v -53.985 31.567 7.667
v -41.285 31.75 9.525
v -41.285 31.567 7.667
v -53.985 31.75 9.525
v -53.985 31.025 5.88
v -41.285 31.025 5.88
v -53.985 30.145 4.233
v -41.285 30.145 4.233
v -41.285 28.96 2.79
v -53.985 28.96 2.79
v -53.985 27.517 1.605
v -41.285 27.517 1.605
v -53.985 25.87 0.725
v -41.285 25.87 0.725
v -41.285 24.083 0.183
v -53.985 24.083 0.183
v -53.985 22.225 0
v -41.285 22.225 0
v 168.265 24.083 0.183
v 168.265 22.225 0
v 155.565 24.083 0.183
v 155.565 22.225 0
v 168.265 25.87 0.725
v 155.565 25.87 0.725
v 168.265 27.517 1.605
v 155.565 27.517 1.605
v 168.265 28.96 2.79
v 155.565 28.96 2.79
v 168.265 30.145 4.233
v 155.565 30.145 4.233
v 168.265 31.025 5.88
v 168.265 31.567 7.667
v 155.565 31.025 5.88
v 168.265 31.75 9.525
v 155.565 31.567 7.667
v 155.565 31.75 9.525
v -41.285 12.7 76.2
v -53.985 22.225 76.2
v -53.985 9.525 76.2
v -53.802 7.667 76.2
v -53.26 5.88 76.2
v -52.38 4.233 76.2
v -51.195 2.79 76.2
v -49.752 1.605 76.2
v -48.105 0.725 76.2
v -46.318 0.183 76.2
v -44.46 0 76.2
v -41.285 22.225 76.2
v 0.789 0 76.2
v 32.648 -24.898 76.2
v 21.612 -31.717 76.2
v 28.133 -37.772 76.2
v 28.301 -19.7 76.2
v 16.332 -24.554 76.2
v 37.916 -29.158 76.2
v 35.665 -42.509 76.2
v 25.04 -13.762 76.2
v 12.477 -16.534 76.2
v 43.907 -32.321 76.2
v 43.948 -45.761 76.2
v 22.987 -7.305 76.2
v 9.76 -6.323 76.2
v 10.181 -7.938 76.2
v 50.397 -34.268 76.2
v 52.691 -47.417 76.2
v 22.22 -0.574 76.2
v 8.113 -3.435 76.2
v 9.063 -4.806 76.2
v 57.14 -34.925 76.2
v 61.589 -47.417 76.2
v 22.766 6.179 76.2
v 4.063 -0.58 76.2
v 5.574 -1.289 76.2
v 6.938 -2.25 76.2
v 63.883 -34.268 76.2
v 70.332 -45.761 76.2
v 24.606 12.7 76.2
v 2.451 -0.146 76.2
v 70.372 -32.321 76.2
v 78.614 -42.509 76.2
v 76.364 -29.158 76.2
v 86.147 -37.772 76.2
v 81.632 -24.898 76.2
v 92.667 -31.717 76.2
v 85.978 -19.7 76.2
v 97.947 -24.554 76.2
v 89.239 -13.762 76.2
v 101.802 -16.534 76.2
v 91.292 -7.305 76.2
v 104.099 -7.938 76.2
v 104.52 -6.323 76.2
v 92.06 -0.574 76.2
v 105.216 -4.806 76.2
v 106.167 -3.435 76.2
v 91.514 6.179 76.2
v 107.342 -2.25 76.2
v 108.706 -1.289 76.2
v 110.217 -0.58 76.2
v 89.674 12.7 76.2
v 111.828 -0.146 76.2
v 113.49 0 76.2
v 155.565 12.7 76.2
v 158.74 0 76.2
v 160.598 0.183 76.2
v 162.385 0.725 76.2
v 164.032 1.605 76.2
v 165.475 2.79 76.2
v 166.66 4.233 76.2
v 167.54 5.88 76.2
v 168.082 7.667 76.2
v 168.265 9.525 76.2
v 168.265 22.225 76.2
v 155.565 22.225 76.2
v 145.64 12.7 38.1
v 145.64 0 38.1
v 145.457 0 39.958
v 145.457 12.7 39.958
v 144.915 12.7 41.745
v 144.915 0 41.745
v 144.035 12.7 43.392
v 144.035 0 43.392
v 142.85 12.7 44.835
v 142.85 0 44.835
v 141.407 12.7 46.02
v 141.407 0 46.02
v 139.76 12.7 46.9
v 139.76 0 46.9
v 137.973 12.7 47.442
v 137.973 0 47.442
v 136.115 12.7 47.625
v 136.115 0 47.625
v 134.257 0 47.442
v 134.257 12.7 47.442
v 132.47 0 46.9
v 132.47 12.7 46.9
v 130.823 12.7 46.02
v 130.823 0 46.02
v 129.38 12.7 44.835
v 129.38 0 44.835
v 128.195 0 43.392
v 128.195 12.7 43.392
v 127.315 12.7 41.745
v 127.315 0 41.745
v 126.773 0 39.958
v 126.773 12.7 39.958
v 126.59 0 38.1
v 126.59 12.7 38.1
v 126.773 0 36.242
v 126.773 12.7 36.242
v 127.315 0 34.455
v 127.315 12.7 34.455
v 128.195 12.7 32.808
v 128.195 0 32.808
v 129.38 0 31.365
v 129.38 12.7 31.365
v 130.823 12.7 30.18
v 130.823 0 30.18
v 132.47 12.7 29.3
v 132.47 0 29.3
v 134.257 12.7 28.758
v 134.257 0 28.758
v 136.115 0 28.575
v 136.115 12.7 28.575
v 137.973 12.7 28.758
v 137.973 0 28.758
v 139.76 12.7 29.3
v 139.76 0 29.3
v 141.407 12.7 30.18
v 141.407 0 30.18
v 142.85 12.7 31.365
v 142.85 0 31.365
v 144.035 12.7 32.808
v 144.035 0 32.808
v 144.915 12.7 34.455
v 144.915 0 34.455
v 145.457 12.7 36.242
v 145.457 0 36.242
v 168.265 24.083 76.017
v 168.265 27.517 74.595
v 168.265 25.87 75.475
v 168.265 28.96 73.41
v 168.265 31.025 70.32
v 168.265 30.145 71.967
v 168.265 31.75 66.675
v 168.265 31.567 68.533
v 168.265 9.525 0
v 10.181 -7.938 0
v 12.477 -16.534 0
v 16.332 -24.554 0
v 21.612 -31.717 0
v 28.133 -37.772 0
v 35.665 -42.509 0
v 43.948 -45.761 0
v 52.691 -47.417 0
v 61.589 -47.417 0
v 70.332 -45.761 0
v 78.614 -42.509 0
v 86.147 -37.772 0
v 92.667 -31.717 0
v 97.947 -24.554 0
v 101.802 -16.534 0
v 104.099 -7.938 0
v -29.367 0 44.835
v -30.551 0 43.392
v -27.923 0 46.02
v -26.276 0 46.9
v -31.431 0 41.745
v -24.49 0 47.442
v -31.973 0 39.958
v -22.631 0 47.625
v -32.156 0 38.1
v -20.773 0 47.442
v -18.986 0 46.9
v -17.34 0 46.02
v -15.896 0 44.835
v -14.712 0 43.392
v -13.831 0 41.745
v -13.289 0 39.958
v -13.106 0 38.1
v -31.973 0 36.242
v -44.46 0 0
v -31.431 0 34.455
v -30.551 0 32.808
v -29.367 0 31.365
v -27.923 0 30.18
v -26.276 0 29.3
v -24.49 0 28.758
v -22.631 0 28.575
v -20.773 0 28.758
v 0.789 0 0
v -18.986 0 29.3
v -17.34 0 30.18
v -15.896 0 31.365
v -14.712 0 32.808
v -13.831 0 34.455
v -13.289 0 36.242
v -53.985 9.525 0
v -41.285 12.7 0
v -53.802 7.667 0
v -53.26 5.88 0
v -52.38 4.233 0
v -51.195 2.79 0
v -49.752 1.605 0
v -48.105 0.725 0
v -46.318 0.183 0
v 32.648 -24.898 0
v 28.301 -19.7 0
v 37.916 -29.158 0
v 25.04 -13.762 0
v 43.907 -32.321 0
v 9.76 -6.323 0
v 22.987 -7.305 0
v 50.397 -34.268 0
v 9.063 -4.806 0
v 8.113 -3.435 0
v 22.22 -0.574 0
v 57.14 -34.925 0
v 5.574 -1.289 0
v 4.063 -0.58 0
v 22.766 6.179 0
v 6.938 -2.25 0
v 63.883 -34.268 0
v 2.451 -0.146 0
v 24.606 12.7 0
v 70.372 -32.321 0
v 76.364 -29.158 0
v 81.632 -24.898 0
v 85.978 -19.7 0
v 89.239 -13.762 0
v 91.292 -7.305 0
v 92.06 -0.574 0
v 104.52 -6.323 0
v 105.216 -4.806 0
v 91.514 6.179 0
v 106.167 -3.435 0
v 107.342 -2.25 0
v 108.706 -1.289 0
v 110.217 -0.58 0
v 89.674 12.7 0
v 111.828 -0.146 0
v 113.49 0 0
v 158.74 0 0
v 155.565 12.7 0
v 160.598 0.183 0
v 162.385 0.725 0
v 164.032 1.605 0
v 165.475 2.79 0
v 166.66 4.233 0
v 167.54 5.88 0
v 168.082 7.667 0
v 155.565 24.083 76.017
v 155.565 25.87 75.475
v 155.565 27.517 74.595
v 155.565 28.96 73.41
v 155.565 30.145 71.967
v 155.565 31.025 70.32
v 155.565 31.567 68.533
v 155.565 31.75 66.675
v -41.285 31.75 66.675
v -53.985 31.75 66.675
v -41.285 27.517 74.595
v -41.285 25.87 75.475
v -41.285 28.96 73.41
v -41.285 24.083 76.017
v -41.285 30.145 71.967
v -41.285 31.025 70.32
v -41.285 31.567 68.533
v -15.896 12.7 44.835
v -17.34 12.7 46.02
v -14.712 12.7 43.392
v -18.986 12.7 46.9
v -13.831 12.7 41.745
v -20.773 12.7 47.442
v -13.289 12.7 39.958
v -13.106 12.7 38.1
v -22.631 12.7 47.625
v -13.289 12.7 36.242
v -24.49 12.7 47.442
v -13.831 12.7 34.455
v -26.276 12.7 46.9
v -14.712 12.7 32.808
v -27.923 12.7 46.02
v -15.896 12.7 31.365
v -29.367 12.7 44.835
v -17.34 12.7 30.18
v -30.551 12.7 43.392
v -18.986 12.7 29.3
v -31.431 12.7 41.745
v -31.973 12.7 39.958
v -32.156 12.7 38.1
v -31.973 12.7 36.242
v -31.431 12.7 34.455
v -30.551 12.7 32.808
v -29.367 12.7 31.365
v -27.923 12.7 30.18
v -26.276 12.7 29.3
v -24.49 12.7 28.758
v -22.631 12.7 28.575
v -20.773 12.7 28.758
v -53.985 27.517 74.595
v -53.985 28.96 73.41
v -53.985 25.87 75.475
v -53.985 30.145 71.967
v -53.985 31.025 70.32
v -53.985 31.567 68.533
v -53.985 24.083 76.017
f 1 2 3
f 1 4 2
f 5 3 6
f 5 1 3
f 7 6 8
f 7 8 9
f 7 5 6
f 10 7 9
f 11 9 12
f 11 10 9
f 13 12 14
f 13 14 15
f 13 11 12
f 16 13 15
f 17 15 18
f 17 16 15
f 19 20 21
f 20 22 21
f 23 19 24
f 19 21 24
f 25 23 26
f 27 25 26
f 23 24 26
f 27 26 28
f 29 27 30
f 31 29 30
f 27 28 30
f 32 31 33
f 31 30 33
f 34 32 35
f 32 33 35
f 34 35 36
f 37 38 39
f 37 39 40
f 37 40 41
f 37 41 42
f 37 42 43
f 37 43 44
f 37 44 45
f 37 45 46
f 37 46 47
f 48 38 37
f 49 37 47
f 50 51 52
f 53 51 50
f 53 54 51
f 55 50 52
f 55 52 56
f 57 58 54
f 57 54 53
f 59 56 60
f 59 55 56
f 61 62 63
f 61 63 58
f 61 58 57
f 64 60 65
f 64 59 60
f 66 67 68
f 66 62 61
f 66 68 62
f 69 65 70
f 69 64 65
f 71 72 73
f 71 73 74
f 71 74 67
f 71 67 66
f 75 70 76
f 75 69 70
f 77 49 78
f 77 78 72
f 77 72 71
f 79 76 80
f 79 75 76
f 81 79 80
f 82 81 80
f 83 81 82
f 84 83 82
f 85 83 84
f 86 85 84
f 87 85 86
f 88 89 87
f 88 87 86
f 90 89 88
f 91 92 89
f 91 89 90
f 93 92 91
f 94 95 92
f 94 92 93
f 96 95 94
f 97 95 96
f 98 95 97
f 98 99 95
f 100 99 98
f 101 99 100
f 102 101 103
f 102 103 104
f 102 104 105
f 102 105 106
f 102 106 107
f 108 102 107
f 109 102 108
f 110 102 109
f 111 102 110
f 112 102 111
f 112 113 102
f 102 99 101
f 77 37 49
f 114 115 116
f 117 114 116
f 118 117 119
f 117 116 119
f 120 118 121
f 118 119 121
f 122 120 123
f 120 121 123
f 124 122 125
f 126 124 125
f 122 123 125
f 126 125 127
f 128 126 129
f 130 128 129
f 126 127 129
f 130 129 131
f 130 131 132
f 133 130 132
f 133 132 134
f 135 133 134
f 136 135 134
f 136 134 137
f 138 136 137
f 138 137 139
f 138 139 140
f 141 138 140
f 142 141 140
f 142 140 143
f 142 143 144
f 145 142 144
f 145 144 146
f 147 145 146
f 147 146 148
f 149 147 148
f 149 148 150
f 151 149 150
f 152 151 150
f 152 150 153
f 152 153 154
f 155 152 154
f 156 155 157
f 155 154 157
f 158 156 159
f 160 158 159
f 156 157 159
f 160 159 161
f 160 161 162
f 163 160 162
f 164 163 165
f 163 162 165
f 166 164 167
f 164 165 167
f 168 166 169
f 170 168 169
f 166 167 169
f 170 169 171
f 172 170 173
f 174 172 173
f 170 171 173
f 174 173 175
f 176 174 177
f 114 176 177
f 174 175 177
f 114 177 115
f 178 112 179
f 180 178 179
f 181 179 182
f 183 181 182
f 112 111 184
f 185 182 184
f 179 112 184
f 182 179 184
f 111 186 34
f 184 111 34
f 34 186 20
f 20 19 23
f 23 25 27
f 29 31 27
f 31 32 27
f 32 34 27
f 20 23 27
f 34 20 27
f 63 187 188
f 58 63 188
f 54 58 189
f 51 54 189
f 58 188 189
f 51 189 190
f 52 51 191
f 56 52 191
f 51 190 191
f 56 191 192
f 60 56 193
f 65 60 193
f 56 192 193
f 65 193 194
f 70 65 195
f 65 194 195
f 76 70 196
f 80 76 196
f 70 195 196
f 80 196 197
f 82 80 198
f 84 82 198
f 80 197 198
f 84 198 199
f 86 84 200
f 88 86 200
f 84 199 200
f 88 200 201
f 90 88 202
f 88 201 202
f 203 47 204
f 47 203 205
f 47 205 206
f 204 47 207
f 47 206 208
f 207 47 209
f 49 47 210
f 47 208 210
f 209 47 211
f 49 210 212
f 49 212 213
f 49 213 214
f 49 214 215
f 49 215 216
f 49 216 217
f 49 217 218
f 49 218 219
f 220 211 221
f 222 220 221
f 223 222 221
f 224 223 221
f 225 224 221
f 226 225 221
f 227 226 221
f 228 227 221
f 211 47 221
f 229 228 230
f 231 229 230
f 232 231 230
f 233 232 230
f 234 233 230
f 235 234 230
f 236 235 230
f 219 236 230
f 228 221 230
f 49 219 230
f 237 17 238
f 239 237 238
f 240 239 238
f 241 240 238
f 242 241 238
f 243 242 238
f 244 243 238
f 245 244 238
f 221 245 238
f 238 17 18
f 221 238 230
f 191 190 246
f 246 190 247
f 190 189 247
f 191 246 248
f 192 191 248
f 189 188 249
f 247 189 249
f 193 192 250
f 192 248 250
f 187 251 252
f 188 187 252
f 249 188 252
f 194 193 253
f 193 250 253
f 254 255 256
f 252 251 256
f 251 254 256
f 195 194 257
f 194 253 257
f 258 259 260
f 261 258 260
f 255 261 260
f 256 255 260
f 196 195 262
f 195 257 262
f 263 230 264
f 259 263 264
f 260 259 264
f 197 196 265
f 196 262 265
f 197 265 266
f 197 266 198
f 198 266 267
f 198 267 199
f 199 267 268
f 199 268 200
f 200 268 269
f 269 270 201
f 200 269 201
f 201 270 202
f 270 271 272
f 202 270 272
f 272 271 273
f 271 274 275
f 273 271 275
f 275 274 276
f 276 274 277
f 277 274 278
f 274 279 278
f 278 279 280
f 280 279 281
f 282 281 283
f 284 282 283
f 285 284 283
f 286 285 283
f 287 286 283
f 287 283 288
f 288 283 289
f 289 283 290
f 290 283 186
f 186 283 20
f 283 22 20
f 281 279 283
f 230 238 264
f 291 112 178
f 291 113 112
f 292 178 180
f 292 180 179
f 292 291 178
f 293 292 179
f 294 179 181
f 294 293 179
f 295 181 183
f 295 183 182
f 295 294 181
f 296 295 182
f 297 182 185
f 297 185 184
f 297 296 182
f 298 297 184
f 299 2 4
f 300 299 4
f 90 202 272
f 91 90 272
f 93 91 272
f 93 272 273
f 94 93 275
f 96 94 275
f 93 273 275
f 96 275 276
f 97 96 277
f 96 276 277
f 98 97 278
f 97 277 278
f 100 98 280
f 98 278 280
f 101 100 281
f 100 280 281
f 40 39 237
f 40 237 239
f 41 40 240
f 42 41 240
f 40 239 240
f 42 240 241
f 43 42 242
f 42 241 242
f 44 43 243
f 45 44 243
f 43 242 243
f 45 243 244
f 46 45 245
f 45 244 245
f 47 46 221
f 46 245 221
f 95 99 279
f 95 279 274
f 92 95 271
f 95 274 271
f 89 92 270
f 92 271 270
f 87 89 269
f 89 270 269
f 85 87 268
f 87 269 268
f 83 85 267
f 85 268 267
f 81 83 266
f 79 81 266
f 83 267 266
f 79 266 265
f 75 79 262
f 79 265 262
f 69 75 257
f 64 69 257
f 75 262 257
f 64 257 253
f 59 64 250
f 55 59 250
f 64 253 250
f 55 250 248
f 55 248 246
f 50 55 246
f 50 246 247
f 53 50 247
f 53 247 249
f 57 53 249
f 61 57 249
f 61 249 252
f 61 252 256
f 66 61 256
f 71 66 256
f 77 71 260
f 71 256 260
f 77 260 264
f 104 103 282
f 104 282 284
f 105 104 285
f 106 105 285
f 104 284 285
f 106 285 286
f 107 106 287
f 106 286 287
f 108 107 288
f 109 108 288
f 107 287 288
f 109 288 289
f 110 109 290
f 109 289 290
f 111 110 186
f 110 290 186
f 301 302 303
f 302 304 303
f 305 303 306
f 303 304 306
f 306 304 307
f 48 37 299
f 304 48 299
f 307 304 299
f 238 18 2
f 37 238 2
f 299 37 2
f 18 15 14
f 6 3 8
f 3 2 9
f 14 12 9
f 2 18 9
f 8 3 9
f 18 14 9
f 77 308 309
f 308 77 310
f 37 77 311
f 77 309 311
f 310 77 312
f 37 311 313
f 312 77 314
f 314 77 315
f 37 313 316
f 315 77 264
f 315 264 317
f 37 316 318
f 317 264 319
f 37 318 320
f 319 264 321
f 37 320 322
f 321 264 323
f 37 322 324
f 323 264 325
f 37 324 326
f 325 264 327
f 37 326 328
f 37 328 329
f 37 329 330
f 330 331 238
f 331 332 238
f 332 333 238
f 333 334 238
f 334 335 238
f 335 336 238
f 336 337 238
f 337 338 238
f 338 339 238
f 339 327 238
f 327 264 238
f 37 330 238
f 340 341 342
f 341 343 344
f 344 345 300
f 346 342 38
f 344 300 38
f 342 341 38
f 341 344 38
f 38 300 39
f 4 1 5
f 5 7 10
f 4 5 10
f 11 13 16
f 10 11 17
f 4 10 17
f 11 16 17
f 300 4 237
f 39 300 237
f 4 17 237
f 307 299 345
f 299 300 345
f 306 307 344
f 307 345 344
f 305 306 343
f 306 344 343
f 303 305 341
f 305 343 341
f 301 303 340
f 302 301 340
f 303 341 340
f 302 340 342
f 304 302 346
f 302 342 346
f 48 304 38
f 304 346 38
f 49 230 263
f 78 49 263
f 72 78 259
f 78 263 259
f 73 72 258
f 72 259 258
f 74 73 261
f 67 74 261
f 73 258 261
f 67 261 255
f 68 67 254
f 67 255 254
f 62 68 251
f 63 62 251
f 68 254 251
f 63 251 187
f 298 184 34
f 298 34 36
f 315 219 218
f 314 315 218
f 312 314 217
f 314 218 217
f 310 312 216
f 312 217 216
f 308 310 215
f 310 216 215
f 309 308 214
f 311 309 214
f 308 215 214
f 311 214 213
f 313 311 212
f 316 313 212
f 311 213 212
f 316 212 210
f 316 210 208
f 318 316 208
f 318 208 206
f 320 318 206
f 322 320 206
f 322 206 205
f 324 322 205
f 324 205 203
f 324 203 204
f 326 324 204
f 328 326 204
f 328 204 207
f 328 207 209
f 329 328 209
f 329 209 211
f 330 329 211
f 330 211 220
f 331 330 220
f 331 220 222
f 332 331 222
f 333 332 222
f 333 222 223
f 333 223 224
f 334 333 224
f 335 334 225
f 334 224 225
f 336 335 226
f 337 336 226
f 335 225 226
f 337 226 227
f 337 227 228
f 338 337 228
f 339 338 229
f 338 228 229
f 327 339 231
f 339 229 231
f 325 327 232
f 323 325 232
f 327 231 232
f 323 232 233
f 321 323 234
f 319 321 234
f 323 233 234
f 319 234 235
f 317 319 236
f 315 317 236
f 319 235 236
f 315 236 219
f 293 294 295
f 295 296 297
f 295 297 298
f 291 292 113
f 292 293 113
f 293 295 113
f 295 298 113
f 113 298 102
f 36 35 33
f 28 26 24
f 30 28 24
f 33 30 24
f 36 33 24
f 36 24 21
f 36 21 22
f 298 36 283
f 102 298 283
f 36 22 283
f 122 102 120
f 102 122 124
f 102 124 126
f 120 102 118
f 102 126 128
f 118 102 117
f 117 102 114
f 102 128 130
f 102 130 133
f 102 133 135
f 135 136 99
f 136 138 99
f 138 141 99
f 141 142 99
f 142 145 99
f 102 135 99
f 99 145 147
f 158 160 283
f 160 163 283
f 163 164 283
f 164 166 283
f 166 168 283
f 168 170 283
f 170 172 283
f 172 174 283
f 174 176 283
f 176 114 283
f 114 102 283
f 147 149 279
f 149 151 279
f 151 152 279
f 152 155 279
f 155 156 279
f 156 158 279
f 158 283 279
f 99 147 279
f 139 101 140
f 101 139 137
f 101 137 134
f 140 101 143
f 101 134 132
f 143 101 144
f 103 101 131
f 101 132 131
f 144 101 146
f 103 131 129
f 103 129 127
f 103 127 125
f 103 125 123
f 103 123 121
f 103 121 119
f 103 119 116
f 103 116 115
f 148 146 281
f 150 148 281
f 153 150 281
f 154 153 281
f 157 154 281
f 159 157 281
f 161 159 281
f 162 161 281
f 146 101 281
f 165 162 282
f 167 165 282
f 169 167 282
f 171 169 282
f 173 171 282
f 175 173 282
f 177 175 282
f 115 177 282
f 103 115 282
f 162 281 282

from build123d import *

# Parameters (mm, degrees)
F1_DEPTH = 76.2
F2_R     = 9.525
F3_DEPTH = 25.4
F4_R     = 9.525


with BuildPart() as f1:
    # F0 (on Top) → F1 (new body)
    with BuildSketch(Plane.XY):
        with BuildLine():
            Line((-41.285193, 12.7), (-41.285193, 31.75))
            Line((-41.285193, 31.75), (-53.985193, 31.75))
            Line((-53.985193, 31.75), (-53.985193, 9.525))
            ThreePointArc((-53.985193, 9.525), (-51.195385, 2.789808), (-44.460193, 0))
            Line((-44.460193, 0), (0.789147, 0))
            ThreePointArc((0.789147, 0), (6.937508, -2.250161), (10.180923, -7.9375))
            ThreePointArc((10.180923, -7.9375), (57.139807, -47.625), (104.09869, -7.9375))
            ThreePointArc((104.09869, -7.9375), (107.342106, -2.250161), (113.490467, 0))
            Line((113.490467, 0), (158.739807, 0))
            ThreePointArc((158.739807, 0), (165.474999, 2.789808), (168.264807, 9.525))
            Line((168.264807, 9.525), (168.264807, 31.75))
            Line((168.264807, 31.75), (155.564807, 31.75))
            Line((155.564807, 31.75), (155.564807, 12.7))
            Line((155.564807, 12.7), (89.673875, 12.7))
            ThreePointArc((89.673875, 12.7), (57.139807, -34.925), (24.605738, 12.7))
            Line((24.605738, 12.7), (-41.285193, 12.7))
        make_face()
    extrude(amount=F1_DEPTH)

    # F2 (on face) → F3 (cut)
    with BuildSketch(Plane.XZ):
        with Locations((136.115137, 38.1)):
            Circle(F2_R)
        with Locations((-22.6314, 38.1)):
            Circle(F2_R)
    extrude(amount=-F3_DEPTH, mode=Mode.SUBTRACT)

    # F4
    f4_edges = [f1.edges().sort_by_distance(p)[0] for p in [
        (-47.635193, 31.75, 76.2),
        (-47.635193, 31.75, 0),
        (161.914807, 31.75, 0),
        (161.914807, 31.75, 76.2),
    ]]
    fillet(f4_edges, radius=F4_R)


solid = f1.part
